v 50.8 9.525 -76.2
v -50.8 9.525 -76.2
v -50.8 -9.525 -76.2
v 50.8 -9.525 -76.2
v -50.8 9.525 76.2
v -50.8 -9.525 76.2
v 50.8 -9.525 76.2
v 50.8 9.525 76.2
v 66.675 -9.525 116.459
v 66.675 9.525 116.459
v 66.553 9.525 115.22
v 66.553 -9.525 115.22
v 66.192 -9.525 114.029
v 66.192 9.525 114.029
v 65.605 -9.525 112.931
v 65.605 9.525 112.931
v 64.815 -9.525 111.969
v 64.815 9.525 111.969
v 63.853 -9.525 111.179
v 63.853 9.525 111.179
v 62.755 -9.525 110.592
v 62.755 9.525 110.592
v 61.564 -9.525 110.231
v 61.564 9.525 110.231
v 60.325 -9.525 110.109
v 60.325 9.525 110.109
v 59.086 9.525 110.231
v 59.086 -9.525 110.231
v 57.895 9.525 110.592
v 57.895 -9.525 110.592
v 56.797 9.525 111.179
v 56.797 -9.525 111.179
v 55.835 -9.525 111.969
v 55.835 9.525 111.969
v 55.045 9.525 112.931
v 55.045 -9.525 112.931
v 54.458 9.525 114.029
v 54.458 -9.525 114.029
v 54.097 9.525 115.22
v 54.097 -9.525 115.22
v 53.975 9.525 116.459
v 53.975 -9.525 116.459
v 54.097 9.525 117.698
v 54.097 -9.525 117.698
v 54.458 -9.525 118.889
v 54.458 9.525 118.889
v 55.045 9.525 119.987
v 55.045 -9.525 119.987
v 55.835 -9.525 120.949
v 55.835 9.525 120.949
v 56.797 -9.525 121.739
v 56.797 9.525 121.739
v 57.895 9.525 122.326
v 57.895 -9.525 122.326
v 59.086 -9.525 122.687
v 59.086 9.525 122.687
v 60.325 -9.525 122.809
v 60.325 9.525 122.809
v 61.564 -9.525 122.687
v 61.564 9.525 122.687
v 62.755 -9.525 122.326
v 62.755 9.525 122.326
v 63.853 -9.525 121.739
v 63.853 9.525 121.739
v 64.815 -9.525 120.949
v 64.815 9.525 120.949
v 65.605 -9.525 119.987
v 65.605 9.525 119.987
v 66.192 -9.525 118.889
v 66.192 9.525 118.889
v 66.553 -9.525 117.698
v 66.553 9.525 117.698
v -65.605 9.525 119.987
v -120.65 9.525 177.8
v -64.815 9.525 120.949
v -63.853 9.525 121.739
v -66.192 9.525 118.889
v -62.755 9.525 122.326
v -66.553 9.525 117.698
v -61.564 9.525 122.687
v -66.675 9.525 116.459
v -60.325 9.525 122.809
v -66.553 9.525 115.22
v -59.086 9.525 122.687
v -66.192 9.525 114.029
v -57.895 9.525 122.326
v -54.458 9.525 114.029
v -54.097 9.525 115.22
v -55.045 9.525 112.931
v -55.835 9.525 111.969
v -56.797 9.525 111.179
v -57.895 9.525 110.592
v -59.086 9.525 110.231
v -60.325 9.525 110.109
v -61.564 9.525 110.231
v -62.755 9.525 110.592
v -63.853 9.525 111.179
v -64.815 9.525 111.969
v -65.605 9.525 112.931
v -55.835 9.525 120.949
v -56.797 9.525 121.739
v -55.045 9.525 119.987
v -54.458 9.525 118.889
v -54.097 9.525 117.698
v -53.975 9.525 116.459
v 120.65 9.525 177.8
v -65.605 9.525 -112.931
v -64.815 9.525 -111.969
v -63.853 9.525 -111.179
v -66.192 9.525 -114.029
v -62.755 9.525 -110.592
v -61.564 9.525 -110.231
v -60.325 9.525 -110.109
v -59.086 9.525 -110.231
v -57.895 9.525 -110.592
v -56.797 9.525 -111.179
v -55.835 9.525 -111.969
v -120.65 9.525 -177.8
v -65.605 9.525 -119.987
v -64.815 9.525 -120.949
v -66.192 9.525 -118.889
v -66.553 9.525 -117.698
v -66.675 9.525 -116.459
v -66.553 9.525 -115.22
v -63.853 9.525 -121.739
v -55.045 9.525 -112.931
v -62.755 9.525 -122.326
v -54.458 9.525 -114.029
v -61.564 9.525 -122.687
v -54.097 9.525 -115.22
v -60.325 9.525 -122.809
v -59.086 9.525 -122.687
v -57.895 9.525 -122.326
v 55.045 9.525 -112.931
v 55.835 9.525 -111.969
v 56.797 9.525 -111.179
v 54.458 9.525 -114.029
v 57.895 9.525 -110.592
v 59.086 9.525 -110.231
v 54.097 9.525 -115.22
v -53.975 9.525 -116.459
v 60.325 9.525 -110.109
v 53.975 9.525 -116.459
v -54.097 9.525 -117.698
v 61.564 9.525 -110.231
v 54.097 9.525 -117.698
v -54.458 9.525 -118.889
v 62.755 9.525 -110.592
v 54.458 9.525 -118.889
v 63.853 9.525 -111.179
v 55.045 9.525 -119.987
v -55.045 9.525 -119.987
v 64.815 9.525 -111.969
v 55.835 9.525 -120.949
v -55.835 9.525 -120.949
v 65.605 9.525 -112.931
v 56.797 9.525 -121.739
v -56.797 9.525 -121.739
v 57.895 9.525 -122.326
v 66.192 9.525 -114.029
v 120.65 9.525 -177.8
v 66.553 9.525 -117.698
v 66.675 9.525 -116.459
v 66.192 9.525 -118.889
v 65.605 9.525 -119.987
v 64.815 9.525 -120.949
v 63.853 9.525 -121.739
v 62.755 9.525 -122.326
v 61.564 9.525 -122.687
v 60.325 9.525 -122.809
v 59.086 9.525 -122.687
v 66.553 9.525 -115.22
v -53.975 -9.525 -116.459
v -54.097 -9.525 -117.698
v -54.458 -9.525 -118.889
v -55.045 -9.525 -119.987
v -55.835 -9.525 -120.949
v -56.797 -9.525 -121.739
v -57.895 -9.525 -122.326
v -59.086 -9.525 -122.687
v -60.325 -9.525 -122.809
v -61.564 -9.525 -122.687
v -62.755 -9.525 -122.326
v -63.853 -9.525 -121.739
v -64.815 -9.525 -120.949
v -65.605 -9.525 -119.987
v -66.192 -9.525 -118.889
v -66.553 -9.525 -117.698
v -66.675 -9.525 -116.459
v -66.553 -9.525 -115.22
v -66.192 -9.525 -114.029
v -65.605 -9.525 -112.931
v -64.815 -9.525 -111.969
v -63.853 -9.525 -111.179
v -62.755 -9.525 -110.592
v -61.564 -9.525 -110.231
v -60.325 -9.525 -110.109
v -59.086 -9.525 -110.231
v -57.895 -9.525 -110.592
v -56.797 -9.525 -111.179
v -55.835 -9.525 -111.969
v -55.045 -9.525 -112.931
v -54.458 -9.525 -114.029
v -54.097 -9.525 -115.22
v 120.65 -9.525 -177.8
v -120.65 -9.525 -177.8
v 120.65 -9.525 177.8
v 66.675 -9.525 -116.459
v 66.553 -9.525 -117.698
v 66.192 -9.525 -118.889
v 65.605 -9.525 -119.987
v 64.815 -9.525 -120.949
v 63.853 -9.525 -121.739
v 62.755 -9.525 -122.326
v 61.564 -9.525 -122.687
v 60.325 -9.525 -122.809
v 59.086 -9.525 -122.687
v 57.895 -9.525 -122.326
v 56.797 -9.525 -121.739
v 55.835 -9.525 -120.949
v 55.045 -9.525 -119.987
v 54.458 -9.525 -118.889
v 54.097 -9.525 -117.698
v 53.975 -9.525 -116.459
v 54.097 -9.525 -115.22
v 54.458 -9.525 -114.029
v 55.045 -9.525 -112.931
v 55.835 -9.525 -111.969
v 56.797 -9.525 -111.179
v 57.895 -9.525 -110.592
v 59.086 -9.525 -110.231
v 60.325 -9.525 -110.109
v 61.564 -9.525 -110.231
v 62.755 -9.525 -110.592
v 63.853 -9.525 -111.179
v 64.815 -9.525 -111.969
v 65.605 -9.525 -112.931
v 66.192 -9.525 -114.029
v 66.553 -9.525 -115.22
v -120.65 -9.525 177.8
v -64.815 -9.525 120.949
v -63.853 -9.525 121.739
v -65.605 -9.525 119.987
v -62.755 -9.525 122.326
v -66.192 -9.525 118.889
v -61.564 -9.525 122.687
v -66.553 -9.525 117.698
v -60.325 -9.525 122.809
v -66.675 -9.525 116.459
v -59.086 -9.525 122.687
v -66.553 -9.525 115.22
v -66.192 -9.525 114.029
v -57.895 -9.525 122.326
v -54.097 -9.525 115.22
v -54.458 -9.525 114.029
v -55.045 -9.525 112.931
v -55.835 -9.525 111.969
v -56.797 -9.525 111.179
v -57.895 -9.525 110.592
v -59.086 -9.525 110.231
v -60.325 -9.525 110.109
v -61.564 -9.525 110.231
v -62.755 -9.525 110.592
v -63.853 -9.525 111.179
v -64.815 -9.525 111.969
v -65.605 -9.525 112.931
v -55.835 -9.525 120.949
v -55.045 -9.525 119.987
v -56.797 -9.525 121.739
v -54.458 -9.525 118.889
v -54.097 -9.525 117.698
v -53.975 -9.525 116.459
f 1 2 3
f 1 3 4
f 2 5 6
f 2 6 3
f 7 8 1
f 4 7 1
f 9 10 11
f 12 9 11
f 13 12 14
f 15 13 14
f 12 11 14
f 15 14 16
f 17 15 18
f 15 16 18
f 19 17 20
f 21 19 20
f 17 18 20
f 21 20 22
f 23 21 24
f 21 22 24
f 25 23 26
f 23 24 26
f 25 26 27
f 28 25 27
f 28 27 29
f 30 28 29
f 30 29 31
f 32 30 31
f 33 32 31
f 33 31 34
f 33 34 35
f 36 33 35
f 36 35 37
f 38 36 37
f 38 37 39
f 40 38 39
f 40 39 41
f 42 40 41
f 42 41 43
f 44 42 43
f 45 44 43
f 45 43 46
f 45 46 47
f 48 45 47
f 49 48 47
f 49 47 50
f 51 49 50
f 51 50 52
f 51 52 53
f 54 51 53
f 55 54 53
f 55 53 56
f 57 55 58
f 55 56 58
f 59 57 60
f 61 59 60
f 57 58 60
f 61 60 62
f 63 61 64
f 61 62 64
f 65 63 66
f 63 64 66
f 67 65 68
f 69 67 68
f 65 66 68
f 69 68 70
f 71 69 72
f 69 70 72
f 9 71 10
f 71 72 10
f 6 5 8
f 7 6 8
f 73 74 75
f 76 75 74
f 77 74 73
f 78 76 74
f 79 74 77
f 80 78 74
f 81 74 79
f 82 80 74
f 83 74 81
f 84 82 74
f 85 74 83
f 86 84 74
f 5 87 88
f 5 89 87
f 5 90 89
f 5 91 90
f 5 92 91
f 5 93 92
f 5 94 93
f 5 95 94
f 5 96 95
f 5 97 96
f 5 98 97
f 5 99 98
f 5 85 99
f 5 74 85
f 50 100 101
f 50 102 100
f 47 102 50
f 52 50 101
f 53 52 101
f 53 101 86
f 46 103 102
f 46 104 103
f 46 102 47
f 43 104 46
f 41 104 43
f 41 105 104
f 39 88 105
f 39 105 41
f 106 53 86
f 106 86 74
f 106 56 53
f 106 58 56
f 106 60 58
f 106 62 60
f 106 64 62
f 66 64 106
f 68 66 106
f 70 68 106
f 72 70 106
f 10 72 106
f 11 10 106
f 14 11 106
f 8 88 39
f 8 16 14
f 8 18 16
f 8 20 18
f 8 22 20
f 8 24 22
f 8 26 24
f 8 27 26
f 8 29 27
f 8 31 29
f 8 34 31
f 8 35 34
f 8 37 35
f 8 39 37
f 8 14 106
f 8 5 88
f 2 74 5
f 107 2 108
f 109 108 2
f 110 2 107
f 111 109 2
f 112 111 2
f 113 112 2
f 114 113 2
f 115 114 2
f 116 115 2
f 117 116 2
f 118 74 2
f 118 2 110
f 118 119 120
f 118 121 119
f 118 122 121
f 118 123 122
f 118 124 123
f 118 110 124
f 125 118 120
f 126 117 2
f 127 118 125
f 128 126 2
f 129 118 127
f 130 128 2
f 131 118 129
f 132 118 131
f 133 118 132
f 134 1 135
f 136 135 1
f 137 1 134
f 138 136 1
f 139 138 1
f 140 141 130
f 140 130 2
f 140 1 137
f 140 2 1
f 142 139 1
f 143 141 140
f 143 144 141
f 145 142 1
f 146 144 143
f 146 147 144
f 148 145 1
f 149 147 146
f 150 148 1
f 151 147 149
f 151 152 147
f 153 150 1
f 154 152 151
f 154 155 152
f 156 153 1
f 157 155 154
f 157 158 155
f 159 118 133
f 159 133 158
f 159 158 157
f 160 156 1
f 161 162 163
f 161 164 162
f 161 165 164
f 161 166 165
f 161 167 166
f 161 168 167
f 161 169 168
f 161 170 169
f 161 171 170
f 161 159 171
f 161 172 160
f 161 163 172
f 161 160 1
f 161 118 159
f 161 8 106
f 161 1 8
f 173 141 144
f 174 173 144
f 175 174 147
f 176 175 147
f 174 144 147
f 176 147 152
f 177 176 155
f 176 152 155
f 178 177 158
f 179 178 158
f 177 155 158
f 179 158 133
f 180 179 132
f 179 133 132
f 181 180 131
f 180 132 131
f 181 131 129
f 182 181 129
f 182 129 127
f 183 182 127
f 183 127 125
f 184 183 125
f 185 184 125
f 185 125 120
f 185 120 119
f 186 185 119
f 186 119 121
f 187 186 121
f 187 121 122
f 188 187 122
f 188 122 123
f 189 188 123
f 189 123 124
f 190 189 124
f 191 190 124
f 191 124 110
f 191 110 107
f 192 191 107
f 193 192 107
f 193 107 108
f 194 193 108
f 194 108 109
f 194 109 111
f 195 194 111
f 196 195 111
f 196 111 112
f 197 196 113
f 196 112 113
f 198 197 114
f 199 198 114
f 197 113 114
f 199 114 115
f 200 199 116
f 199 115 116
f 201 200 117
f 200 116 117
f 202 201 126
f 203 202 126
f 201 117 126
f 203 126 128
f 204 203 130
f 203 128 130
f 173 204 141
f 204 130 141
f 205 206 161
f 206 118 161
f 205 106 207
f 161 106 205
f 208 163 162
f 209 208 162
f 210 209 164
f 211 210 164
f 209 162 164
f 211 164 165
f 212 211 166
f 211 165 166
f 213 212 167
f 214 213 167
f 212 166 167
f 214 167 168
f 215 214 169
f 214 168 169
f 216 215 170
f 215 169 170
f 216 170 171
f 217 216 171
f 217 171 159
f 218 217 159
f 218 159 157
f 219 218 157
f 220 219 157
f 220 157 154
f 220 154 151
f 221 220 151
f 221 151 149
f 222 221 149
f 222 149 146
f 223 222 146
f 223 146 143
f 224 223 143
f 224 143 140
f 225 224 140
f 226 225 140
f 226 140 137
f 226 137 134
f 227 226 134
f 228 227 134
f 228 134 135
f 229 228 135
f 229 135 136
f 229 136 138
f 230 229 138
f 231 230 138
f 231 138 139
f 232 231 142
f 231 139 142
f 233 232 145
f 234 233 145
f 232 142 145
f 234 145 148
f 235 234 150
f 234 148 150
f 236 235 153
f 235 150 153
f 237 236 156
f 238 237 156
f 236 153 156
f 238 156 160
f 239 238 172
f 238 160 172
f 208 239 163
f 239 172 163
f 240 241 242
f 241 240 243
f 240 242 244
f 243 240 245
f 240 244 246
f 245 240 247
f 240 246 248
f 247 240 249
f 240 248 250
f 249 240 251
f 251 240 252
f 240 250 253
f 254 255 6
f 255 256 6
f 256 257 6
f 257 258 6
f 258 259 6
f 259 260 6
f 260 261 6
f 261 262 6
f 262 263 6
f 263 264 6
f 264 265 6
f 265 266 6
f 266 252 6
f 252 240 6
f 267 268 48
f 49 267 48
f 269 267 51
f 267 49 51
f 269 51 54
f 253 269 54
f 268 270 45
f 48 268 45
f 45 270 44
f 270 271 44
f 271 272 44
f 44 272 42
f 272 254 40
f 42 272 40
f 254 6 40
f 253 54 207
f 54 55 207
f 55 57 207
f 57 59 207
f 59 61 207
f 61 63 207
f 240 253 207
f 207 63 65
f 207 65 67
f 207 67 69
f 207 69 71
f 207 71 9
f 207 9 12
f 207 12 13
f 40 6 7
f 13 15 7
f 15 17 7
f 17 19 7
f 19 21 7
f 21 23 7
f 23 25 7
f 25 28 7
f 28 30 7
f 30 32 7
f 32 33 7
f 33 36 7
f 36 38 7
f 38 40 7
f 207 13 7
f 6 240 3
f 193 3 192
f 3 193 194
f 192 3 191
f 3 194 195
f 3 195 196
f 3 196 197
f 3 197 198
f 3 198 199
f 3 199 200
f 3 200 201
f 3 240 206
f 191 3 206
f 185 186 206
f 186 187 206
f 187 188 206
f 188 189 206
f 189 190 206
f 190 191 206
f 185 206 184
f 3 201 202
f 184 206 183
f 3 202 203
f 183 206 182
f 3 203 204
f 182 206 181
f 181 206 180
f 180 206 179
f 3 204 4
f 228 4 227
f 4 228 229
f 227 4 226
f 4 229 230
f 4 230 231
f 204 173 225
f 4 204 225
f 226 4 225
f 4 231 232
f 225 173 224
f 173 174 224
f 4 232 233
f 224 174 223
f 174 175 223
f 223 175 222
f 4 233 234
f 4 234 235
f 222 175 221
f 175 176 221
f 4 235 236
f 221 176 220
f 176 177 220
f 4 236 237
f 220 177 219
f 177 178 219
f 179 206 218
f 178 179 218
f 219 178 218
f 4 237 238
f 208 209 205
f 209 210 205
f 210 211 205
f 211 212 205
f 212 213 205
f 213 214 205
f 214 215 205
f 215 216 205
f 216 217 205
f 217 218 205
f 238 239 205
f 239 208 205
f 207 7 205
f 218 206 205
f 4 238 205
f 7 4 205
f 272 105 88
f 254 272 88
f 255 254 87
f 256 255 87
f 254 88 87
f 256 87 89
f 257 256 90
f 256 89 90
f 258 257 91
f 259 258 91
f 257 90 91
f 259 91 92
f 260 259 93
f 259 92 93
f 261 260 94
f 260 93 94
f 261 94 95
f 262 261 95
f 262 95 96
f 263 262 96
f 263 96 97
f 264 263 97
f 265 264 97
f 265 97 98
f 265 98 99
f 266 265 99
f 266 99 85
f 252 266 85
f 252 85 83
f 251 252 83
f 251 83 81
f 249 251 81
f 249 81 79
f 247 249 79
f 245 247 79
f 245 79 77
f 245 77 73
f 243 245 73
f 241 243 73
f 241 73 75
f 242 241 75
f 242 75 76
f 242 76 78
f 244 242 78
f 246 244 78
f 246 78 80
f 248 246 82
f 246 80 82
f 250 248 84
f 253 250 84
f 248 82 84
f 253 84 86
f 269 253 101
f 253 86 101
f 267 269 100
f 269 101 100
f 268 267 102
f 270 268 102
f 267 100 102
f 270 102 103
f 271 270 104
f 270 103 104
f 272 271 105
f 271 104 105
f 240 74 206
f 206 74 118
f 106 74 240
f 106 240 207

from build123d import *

# Parameters (mm, degrees)
SKETCH1_W               = 241.3
SKETCH1_H               = 355.6
BOSS_EXTRUDE1_DEPTH     = 9.525
SKETCH2_R               = 6.35
CUT_EXTRUDE1_DEPTH      = 20.05
SKETCH3_W               = 101.6
SKETCH3_H               = 152.4
CUT_EXTRUDE2_DEPTH      = 1
CUT_EXTRUDE2_DEPTH_BACK = 20.05


with BuildPart() as part:
    # Sketch1 → Boss-Extrude1 (new body, symmetric)
    with BuildSketch(Plane(origin=(0, 0, 0), x_dir=(1, 0, 0), z_dir=(0, 1, 0))):
        Rectangle(SKETCH1_W, SKETCH1_H)
    extrude(amount=BOSS_EXTRUDE1_DEPTH, both=True)

    # Sketch2 → Cut-Extrude1 (cut, through all)
    with BuildSketch(Plane(origin=(0, 9.525, 0), x_dir=(1, 0, 0), z_dir=(0, 1, 0))):
        with Locations((-60.325, 116.459)):
            Circle(SKETCH2_R)
        with Locations((60.325, 116.459)):
            Circle(SKETCH2_R)
        with Locations((60.325, -116.459)):
            Circle(SKETCH2_R)
        with Locations((-60.325, -116.459)):
            Circle(SKETCH2_R)
    extrude(amount=-CUT_EXTRUDE1_DEPTH, mode=Mode.SUBTRACT)

    # Sketch3 → Cut-Extrude2 (cut, two sides)
    with BuildSketch(Plane(origin=(0, 9.525, 0), x_dir=(1, 0, 0), z_dir=(0, 1, 0))) as cut_extrude2_sk:
        Rectangle(SKETCH3_W, SKETCH3_H)
    extrude(amount=CUT_EXTRUDE2_DEPTH, mode=Mode.SUBTRACT)
    extrude(cut_extrude2_sk.sketch, amount=-CUT_EXTRUDE2_DEPTH_BACK, mode=Mode.SUBTRACT)


solid = part.part
